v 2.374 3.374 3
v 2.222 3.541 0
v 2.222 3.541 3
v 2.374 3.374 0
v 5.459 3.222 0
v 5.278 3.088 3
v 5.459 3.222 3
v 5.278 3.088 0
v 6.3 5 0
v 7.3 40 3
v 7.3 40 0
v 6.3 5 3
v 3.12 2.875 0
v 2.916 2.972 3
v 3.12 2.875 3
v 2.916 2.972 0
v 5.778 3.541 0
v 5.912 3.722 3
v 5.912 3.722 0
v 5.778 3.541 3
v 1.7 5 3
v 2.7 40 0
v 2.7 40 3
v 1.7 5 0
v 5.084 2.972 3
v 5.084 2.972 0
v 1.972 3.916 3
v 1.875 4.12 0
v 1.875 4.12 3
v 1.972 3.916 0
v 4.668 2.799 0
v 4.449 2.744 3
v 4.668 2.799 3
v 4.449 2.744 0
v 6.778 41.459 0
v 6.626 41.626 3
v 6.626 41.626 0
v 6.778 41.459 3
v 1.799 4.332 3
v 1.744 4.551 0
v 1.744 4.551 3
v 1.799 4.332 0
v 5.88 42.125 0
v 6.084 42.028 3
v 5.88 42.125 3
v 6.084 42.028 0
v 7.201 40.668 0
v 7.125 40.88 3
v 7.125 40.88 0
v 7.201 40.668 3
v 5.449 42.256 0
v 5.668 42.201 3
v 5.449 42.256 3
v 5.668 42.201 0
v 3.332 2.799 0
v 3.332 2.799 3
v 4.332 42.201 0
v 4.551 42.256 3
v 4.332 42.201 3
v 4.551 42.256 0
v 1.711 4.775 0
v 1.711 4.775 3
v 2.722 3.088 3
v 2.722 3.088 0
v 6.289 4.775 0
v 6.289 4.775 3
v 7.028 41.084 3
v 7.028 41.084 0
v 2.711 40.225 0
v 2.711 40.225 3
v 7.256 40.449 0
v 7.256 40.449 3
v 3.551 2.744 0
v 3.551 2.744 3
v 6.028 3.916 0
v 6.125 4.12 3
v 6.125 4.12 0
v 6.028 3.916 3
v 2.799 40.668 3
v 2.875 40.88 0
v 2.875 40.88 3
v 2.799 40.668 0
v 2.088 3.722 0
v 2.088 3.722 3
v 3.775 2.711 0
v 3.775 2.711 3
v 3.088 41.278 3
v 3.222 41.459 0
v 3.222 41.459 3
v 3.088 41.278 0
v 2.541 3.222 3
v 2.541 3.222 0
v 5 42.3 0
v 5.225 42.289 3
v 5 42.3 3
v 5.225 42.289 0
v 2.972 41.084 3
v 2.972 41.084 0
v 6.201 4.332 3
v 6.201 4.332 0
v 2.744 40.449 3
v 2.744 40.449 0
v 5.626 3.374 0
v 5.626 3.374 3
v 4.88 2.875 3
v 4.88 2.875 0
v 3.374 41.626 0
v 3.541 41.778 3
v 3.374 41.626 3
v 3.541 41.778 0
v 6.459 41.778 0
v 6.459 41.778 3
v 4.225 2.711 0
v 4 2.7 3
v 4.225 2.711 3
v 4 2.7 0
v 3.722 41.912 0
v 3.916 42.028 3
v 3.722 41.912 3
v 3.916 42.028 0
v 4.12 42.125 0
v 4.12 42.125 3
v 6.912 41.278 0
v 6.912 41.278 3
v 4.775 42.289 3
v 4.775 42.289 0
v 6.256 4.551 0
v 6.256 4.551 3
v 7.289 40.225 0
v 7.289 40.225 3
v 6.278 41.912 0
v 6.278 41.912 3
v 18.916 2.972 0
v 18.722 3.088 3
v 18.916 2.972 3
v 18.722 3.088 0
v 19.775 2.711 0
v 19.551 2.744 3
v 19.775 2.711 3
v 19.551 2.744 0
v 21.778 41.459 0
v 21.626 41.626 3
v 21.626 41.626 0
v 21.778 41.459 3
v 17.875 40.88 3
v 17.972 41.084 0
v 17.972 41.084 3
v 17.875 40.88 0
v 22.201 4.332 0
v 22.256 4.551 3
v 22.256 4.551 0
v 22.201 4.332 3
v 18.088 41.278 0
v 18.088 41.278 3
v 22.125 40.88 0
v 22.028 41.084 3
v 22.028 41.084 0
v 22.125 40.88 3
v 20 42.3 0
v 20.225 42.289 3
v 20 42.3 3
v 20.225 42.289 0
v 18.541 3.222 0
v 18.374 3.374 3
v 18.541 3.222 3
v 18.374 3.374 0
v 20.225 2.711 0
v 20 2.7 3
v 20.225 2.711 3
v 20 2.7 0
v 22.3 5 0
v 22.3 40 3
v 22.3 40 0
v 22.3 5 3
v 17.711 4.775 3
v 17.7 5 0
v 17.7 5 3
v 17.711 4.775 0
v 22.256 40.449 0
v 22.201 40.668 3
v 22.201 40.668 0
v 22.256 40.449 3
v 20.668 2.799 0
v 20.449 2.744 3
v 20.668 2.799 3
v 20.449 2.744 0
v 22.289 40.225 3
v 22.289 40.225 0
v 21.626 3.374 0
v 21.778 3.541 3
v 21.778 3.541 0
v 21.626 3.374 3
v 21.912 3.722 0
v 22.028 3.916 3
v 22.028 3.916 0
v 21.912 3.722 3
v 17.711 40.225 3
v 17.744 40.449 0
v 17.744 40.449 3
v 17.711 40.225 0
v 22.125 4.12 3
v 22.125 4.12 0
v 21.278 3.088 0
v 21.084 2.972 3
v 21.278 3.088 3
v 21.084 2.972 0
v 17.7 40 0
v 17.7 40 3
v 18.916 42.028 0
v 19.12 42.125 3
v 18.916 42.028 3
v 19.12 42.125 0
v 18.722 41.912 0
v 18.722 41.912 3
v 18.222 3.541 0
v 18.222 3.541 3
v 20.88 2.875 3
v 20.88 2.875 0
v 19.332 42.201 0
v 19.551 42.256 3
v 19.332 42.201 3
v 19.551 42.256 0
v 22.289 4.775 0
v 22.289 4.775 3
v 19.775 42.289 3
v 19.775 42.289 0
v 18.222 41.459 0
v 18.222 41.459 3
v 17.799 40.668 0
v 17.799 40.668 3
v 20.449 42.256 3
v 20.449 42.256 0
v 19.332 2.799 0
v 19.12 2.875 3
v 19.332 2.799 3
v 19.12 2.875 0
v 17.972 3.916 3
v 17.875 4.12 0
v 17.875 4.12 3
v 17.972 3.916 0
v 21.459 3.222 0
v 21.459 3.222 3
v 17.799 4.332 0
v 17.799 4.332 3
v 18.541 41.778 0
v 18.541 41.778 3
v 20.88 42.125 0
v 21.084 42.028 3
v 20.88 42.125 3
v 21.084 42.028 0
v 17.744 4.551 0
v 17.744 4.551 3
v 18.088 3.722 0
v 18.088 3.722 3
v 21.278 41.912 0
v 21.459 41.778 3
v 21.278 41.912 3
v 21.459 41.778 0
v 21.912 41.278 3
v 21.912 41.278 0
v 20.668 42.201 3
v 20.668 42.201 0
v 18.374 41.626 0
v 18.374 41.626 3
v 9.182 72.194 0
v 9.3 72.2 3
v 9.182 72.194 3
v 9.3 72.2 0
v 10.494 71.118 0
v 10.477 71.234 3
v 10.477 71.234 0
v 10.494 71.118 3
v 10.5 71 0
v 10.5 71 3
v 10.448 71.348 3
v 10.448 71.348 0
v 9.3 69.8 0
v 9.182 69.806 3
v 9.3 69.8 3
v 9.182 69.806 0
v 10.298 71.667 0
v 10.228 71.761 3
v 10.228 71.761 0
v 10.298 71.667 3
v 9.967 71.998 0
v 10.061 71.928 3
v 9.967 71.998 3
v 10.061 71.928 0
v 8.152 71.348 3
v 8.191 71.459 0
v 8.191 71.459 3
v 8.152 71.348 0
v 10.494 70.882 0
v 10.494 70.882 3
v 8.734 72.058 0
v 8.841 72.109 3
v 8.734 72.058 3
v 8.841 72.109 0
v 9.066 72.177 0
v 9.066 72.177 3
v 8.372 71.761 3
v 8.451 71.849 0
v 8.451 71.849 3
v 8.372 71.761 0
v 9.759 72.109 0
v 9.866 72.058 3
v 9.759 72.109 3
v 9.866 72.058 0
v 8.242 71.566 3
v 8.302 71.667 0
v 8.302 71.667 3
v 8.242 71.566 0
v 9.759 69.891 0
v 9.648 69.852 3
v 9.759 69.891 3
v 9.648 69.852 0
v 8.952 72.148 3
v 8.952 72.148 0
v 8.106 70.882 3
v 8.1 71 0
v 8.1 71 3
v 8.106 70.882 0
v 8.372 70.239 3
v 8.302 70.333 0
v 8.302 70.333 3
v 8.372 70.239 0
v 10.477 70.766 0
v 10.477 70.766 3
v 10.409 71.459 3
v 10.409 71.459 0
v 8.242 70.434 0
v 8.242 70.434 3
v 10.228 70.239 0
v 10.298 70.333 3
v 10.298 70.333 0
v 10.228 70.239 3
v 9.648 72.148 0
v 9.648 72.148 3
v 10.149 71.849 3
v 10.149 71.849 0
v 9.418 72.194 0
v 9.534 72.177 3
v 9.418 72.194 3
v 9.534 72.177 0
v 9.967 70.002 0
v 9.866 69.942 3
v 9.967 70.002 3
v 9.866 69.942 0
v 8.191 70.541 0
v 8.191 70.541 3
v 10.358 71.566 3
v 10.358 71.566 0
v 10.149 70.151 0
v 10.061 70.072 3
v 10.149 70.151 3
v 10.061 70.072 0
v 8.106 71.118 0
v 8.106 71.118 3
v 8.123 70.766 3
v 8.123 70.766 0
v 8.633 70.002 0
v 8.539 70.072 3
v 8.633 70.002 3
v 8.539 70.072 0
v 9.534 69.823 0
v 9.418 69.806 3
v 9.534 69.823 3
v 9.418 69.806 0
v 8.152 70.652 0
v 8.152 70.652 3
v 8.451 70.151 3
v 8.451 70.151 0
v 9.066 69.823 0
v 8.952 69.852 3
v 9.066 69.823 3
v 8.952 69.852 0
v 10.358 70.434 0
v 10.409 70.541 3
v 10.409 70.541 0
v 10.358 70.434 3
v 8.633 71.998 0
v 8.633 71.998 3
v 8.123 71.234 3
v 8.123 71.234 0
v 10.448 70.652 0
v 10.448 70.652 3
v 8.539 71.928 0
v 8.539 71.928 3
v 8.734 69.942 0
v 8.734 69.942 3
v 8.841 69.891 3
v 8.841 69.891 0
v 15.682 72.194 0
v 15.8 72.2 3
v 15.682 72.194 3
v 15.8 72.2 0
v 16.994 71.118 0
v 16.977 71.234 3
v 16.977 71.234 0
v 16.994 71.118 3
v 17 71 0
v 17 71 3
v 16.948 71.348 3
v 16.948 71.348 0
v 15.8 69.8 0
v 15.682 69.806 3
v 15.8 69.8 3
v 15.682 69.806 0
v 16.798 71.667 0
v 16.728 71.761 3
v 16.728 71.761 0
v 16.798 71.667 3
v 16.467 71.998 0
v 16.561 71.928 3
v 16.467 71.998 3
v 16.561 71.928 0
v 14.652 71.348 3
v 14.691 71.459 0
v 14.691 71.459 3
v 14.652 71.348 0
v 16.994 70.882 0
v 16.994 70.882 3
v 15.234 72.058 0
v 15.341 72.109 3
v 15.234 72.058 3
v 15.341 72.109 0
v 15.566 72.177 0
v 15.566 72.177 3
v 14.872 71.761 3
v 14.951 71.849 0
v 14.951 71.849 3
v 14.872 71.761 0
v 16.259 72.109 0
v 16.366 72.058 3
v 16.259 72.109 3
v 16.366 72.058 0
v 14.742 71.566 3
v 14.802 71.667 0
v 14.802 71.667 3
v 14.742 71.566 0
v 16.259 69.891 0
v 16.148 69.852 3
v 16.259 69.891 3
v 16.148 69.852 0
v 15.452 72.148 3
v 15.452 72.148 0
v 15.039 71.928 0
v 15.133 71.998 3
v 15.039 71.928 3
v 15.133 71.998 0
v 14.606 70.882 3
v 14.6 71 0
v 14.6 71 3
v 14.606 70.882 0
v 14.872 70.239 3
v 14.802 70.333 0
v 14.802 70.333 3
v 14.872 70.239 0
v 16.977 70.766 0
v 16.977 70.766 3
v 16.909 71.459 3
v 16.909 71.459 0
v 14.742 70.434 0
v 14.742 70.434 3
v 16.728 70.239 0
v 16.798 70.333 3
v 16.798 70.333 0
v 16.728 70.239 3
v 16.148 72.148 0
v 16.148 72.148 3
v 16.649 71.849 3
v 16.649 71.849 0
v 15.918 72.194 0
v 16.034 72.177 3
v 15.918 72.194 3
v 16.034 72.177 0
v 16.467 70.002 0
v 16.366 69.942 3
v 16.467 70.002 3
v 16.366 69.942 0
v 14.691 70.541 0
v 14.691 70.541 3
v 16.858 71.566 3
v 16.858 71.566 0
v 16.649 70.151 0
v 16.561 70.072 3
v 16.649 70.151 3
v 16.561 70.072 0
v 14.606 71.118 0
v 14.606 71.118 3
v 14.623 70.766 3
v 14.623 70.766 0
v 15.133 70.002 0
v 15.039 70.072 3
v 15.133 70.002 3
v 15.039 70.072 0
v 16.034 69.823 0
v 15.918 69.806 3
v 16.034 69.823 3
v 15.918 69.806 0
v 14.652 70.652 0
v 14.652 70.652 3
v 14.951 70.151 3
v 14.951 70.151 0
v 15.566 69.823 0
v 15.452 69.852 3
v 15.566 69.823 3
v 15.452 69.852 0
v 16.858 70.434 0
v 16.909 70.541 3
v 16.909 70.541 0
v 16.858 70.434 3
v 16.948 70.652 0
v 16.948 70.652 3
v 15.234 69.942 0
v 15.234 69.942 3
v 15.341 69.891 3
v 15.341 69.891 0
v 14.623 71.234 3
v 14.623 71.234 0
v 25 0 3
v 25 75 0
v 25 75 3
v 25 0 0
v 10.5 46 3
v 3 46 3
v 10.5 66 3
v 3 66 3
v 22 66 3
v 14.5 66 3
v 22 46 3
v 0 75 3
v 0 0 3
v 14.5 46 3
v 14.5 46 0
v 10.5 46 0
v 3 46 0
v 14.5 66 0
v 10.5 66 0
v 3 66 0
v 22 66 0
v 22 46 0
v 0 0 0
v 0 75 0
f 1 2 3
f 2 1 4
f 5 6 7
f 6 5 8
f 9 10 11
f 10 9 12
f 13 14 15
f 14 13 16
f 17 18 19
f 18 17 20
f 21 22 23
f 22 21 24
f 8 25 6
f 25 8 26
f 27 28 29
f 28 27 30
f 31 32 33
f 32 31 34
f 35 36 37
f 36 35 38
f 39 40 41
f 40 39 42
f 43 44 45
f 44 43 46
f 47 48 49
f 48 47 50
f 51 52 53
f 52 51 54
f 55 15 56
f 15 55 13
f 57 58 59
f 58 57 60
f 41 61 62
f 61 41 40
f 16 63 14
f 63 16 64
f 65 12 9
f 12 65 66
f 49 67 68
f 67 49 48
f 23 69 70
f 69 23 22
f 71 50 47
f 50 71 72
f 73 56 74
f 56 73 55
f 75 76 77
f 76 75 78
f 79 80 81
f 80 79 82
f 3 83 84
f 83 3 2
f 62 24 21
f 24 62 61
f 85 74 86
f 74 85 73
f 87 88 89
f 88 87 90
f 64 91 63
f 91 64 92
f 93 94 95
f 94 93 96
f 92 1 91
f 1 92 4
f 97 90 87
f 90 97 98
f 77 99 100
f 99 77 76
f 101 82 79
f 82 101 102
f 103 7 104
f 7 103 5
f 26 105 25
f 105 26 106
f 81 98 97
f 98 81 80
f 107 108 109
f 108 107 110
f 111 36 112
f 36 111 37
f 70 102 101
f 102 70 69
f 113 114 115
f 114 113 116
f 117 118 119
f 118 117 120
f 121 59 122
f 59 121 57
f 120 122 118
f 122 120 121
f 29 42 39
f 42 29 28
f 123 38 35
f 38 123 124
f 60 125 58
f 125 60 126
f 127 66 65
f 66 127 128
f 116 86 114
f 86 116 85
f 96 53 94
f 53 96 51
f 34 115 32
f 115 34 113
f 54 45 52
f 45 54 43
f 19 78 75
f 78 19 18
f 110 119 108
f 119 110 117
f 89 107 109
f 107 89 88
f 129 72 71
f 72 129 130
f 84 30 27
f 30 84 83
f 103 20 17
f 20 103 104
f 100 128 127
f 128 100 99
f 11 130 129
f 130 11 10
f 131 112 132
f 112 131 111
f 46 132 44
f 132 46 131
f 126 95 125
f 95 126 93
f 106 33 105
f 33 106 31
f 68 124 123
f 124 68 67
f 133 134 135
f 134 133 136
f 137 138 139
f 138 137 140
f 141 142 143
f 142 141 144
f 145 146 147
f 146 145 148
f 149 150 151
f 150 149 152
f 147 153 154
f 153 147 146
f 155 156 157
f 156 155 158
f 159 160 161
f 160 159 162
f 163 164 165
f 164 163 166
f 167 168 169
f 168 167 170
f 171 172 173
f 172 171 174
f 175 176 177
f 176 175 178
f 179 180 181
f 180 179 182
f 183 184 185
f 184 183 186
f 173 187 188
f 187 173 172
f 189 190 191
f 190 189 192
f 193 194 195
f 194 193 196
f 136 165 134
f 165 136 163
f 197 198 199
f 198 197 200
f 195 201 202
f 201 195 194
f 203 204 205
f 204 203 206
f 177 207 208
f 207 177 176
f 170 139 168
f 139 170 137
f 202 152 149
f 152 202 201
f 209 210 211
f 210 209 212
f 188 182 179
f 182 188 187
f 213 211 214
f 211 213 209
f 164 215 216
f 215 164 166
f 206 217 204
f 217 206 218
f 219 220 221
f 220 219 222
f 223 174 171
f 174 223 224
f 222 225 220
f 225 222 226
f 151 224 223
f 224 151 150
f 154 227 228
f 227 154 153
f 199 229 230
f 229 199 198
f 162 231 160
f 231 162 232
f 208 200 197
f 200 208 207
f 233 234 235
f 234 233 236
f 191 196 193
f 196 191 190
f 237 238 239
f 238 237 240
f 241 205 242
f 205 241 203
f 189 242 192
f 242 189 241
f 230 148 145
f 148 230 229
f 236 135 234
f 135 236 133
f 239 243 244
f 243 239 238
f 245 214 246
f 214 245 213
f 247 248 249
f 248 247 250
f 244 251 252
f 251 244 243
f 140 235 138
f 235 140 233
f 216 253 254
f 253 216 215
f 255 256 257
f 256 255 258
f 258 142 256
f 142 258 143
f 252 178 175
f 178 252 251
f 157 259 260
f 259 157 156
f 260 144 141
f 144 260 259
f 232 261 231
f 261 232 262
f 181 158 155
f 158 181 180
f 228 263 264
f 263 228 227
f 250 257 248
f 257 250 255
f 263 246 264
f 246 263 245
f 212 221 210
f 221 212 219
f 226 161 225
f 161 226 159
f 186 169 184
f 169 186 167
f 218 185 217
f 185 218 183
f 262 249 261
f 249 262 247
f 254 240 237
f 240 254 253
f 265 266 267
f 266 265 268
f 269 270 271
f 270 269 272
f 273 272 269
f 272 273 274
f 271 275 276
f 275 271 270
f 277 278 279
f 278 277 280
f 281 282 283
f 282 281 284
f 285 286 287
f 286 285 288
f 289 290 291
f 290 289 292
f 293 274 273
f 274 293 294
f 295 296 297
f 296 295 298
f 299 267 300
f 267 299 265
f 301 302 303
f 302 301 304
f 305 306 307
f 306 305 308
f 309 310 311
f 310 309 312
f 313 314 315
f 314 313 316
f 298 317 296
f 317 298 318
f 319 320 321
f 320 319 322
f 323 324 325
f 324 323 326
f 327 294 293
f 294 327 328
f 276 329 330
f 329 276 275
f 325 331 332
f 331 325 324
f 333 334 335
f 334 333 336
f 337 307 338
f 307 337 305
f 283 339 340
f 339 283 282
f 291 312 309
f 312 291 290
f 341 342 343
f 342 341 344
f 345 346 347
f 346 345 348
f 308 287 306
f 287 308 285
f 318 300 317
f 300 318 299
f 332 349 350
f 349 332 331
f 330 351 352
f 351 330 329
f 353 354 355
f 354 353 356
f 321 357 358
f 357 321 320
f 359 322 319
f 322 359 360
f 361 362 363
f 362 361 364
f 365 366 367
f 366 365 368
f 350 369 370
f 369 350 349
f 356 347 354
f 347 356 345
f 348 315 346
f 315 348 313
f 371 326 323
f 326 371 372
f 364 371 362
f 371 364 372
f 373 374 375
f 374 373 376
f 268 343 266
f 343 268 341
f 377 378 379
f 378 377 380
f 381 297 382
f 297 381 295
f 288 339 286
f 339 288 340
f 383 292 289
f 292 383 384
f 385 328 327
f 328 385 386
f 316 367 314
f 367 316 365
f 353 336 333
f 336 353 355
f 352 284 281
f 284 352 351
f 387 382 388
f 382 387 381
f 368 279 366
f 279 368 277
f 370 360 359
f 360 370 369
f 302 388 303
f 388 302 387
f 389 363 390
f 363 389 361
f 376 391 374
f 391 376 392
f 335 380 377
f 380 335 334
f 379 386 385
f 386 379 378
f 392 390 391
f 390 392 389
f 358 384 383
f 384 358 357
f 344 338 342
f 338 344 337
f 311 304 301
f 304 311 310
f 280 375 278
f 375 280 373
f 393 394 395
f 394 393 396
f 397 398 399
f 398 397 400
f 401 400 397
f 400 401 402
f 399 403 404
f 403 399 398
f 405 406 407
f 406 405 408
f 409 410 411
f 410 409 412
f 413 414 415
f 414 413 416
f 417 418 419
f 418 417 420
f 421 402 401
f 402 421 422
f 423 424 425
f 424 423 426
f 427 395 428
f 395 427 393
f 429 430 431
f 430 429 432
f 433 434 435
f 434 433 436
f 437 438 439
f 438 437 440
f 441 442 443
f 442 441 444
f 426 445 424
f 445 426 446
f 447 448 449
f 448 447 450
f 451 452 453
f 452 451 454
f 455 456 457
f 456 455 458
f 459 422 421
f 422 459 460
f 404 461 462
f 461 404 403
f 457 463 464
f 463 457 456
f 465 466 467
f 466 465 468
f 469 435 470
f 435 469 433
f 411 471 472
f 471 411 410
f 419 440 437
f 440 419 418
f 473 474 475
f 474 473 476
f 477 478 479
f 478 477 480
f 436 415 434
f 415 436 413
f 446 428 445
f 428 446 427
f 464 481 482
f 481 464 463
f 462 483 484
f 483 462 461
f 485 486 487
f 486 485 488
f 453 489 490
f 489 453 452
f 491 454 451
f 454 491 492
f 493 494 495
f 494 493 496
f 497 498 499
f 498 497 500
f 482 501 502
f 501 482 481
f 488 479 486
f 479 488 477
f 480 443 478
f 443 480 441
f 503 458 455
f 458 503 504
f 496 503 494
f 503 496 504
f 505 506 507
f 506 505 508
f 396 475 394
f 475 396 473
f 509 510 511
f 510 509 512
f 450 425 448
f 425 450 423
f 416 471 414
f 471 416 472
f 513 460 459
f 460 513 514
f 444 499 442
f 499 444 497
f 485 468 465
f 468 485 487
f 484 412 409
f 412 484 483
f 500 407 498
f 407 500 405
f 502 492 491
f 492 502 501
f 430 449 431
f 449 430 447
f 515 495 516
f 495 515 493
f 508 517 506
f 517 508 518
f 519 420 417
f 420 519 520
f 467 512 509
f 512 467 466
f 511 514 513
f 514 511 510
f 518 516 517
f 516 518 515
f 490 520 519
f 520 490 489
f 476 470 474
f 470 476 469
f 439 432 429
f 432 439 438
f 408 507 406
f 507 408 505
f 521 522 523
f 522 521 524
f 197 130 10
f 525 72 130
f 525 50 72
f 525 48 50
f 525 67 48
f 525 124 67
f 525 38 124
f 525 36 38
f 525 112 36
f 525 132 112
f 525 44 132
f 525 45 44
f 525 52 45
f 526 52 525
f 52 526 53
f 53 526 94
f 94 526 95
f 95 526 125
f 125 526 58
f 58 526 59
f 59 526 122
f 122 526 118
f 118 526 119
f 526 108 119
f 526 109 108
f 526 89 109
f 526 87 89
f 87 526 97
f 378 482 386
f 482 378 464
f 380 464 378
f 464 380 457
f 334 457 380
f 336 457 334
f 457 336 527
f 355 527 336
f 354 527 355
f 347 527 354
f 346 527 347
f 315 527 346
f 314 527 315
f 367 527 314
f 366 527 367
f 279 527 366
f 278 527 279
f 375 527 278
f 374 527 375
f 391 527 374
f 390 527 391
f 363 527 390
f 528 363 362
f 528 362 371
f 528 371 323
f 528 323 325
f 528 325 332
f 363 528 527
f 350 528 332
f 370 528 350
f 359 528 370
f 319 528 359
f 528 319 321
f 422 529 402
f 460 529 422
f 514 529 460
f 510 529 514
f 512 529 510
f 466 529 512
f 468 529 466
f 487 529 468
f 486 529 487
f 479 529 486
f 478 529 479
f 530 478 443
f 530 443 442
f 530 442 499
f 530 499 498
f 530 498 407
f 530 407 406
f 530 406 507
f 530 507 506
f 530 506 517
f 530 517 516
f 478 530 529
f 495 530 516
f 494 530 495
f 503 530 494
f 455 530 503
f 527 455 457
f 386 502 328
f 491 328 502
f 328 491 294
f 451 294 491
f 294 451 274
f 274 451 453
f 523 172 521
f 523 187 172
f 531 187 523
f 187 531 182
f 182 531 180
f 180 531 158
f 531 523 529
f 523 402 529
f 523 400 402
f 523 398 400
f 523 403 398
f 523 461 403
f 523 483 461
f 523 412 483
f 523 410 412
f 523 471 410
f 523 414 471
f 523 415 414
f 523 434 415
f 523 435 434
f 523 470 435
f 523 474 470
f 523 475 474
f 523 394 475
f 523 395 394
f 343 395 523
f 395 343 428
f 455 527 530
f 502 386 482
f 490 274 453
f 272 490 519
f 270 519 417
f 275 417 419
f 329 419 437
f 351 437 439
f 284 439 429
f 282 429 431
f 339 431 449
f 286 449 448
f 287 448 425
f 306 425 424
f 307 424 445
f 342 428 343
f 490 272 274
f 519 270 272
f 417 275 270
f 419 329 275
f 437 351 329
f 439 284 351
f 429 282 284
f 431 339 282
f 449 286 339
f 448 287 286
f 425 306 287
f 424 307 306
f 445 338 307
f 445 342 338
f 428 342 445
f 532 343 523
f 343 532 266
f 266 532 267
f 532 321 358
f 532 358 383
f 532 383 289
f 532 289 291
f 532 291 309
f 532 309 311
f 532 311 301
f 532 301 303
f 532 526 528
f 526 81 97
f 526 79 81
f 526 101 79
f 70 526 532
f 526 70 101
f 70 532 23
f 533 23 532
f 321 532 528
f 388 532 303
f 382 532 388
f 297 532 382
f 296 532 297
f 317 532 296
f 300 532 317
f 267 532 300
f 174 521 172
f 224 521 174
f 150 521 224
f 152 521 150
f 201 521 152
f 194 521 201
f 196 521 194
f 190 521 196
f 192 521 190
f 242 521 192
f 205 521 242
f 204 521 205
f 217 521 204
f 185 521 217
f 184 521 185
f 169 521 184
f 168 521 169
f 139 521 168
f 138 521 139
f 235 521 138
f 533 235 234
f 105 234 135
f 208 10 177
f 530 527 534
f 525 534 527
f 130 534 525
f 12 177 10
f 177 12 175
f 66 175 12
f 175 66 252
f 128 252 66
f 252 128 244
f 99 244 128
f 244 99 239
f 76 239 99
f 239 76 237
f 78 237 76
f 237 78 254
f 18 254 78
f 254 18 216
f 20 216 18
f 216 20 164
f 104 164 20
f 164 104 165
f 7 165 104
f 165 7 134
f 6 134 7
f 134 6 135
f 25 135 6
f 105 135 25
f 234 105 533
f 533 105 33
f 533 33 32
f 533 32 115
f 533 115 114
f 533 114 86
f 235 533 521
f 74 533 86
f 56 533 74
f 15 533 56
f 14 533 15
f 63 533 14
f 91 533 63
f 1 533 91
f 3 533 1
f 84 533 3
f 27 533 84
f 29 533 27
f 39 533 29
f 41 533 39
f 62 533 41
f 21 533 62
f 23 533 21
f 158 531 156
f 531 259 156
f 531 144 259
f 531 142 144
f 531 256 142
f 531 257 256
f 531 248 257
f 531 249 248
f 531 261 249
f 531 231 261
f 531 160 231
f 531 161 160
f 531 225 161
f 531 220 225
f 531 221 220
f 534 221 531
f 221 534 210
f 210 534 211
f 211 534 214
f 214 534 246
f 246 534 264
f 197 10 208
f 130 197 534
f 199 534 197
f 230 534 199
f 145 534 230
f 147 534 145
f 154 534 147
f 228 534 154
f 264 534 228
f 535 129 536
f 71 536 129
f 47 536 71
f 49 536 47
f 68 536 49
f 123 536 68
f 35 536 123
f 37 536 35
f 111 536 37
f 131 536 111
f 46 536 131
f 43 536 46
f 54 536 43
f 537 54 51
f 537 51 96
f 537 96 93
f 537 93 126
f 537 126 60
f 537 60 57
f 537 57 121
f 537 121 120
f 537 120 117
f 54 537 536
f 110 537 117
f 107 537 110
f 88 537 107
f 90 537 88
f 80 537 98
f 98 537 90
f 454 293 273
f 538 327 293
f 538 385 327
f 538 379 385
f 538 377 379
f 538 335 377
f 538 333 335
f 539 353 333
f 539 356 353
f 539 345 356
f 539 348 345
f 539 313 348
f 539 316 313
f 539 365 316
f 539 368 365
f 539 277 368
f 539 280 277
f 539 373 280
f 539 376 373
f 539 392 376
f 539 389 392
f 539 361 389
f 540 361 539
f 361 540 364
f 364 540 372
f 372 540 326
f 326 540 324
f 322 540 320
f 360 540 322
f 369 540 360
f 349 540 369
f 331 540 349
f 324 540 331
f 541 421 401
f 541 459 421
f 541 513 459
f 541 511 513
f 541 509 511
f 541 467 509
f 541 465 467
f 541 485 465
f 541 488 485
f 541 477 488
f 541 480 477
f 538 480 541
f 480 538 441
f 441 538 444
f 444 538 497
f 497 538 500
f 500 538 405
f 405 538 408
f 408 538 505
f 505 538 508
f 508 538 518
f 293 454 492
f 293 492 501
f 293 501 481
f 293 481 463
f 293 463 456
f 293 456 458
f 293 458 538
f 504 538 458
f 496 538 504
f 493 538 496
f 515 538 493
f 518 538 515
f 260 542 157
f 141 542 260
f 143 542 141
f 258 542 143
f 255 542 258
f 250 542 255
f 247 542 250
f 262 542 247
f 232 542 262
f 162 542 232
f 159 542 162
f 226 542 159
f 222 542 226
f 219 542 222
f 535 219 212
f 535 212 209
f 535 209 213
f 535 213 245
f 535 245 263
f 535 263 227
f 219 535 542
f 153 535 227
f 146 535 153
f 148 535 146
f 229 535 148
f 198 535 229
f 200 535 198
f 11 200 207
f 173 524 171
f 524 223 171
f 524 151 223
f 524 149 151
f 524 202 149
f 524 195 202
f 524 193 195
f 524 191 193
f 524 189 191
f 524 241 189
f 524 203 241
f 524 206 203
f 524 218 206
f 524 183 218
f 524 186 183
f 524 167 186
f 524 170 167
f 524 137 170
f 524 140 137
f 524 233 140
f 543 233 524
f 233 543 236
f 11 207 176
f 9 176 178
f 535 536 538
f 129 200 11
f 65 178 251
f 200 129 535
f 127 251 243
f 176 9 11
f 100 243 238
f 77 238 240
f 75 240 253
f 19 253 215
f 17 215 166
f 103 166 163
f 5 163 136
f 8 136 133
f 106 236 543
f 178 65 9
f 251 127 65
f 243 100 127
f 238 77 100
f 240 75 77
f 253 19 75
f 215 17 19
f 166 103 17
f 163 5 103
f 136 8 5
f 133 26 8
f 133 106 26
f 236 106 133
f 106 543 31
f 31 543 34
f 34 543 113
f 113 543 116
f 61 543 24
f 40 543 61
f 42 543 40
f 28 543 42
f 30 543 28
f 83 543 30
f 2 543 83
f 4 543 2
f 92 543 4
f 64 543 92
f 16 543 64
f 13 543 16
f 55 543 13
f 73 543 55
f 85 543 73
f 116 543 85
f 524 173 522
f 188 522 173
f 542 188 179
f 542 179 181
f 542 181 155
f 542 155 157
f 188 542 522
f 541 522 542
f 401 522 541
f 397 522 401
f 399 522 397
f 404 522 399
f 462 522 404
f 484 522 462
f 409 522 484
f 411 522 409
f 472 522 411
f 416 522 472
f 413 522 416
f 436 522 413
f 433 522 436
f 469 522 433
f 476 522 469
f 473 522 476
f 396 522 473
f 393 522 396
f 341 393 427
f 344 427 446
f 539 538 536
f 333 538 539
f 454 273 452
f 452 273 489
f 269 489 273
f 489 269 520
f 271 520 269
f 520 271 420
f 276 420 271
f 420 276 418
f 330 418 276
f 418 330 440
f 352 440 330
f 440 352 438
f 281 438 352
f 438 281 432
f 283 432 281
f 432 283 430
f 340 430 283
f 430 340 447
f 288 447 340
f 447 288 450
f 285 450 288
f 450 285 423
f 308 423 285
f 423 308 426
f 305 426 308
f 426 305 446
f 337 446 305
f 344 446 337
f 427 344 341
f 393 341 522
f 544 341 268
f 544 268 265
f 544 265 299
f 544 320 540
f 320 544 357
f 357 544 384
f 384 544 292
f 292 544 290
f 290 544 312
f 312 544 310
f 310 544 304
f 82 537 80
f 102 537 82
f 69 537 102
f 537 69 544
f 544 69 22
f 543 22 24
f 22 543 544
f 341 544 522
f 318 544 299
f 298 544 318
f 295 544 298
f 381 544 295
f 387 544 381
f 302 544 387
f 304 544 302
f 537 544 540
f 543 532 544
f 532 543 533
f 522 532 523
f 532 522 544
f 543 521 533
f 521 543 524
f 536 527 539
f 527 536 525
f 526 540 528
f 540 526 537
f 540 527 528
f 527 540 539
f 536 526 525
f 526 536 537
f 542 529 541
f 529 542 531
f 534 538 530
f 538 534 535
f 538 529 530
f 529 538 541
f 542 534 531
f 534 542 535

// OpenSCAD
$fn=64;

module slots(){
hull(){
translate([4,5,-0.5])
cylinder(d=4.6, h=4);
translate([5,40,-0.5])
cylinder(d=4.6, h=4);
}
hull(){
translate([20,5,-0.5])
cylinder(d=4.6, h=4);
translate([20,40,-0.5])
cylinder(d=4.6, h=4);
}
}
module switchholes(){
translate([0,0,-1])
cylinder(d=2.4,h=5);
translate([6.5,0,-1])
cylinder(d=2.4,h=5);
}

difference(){
cube([25,75,3]);
slots();



translate([3,46,-1])
cube([7.5,20,5]);
translate([14.5,46,-1])
cube([7.5,20,5]);
translate([9.3,71,0])
switchholes();
}
